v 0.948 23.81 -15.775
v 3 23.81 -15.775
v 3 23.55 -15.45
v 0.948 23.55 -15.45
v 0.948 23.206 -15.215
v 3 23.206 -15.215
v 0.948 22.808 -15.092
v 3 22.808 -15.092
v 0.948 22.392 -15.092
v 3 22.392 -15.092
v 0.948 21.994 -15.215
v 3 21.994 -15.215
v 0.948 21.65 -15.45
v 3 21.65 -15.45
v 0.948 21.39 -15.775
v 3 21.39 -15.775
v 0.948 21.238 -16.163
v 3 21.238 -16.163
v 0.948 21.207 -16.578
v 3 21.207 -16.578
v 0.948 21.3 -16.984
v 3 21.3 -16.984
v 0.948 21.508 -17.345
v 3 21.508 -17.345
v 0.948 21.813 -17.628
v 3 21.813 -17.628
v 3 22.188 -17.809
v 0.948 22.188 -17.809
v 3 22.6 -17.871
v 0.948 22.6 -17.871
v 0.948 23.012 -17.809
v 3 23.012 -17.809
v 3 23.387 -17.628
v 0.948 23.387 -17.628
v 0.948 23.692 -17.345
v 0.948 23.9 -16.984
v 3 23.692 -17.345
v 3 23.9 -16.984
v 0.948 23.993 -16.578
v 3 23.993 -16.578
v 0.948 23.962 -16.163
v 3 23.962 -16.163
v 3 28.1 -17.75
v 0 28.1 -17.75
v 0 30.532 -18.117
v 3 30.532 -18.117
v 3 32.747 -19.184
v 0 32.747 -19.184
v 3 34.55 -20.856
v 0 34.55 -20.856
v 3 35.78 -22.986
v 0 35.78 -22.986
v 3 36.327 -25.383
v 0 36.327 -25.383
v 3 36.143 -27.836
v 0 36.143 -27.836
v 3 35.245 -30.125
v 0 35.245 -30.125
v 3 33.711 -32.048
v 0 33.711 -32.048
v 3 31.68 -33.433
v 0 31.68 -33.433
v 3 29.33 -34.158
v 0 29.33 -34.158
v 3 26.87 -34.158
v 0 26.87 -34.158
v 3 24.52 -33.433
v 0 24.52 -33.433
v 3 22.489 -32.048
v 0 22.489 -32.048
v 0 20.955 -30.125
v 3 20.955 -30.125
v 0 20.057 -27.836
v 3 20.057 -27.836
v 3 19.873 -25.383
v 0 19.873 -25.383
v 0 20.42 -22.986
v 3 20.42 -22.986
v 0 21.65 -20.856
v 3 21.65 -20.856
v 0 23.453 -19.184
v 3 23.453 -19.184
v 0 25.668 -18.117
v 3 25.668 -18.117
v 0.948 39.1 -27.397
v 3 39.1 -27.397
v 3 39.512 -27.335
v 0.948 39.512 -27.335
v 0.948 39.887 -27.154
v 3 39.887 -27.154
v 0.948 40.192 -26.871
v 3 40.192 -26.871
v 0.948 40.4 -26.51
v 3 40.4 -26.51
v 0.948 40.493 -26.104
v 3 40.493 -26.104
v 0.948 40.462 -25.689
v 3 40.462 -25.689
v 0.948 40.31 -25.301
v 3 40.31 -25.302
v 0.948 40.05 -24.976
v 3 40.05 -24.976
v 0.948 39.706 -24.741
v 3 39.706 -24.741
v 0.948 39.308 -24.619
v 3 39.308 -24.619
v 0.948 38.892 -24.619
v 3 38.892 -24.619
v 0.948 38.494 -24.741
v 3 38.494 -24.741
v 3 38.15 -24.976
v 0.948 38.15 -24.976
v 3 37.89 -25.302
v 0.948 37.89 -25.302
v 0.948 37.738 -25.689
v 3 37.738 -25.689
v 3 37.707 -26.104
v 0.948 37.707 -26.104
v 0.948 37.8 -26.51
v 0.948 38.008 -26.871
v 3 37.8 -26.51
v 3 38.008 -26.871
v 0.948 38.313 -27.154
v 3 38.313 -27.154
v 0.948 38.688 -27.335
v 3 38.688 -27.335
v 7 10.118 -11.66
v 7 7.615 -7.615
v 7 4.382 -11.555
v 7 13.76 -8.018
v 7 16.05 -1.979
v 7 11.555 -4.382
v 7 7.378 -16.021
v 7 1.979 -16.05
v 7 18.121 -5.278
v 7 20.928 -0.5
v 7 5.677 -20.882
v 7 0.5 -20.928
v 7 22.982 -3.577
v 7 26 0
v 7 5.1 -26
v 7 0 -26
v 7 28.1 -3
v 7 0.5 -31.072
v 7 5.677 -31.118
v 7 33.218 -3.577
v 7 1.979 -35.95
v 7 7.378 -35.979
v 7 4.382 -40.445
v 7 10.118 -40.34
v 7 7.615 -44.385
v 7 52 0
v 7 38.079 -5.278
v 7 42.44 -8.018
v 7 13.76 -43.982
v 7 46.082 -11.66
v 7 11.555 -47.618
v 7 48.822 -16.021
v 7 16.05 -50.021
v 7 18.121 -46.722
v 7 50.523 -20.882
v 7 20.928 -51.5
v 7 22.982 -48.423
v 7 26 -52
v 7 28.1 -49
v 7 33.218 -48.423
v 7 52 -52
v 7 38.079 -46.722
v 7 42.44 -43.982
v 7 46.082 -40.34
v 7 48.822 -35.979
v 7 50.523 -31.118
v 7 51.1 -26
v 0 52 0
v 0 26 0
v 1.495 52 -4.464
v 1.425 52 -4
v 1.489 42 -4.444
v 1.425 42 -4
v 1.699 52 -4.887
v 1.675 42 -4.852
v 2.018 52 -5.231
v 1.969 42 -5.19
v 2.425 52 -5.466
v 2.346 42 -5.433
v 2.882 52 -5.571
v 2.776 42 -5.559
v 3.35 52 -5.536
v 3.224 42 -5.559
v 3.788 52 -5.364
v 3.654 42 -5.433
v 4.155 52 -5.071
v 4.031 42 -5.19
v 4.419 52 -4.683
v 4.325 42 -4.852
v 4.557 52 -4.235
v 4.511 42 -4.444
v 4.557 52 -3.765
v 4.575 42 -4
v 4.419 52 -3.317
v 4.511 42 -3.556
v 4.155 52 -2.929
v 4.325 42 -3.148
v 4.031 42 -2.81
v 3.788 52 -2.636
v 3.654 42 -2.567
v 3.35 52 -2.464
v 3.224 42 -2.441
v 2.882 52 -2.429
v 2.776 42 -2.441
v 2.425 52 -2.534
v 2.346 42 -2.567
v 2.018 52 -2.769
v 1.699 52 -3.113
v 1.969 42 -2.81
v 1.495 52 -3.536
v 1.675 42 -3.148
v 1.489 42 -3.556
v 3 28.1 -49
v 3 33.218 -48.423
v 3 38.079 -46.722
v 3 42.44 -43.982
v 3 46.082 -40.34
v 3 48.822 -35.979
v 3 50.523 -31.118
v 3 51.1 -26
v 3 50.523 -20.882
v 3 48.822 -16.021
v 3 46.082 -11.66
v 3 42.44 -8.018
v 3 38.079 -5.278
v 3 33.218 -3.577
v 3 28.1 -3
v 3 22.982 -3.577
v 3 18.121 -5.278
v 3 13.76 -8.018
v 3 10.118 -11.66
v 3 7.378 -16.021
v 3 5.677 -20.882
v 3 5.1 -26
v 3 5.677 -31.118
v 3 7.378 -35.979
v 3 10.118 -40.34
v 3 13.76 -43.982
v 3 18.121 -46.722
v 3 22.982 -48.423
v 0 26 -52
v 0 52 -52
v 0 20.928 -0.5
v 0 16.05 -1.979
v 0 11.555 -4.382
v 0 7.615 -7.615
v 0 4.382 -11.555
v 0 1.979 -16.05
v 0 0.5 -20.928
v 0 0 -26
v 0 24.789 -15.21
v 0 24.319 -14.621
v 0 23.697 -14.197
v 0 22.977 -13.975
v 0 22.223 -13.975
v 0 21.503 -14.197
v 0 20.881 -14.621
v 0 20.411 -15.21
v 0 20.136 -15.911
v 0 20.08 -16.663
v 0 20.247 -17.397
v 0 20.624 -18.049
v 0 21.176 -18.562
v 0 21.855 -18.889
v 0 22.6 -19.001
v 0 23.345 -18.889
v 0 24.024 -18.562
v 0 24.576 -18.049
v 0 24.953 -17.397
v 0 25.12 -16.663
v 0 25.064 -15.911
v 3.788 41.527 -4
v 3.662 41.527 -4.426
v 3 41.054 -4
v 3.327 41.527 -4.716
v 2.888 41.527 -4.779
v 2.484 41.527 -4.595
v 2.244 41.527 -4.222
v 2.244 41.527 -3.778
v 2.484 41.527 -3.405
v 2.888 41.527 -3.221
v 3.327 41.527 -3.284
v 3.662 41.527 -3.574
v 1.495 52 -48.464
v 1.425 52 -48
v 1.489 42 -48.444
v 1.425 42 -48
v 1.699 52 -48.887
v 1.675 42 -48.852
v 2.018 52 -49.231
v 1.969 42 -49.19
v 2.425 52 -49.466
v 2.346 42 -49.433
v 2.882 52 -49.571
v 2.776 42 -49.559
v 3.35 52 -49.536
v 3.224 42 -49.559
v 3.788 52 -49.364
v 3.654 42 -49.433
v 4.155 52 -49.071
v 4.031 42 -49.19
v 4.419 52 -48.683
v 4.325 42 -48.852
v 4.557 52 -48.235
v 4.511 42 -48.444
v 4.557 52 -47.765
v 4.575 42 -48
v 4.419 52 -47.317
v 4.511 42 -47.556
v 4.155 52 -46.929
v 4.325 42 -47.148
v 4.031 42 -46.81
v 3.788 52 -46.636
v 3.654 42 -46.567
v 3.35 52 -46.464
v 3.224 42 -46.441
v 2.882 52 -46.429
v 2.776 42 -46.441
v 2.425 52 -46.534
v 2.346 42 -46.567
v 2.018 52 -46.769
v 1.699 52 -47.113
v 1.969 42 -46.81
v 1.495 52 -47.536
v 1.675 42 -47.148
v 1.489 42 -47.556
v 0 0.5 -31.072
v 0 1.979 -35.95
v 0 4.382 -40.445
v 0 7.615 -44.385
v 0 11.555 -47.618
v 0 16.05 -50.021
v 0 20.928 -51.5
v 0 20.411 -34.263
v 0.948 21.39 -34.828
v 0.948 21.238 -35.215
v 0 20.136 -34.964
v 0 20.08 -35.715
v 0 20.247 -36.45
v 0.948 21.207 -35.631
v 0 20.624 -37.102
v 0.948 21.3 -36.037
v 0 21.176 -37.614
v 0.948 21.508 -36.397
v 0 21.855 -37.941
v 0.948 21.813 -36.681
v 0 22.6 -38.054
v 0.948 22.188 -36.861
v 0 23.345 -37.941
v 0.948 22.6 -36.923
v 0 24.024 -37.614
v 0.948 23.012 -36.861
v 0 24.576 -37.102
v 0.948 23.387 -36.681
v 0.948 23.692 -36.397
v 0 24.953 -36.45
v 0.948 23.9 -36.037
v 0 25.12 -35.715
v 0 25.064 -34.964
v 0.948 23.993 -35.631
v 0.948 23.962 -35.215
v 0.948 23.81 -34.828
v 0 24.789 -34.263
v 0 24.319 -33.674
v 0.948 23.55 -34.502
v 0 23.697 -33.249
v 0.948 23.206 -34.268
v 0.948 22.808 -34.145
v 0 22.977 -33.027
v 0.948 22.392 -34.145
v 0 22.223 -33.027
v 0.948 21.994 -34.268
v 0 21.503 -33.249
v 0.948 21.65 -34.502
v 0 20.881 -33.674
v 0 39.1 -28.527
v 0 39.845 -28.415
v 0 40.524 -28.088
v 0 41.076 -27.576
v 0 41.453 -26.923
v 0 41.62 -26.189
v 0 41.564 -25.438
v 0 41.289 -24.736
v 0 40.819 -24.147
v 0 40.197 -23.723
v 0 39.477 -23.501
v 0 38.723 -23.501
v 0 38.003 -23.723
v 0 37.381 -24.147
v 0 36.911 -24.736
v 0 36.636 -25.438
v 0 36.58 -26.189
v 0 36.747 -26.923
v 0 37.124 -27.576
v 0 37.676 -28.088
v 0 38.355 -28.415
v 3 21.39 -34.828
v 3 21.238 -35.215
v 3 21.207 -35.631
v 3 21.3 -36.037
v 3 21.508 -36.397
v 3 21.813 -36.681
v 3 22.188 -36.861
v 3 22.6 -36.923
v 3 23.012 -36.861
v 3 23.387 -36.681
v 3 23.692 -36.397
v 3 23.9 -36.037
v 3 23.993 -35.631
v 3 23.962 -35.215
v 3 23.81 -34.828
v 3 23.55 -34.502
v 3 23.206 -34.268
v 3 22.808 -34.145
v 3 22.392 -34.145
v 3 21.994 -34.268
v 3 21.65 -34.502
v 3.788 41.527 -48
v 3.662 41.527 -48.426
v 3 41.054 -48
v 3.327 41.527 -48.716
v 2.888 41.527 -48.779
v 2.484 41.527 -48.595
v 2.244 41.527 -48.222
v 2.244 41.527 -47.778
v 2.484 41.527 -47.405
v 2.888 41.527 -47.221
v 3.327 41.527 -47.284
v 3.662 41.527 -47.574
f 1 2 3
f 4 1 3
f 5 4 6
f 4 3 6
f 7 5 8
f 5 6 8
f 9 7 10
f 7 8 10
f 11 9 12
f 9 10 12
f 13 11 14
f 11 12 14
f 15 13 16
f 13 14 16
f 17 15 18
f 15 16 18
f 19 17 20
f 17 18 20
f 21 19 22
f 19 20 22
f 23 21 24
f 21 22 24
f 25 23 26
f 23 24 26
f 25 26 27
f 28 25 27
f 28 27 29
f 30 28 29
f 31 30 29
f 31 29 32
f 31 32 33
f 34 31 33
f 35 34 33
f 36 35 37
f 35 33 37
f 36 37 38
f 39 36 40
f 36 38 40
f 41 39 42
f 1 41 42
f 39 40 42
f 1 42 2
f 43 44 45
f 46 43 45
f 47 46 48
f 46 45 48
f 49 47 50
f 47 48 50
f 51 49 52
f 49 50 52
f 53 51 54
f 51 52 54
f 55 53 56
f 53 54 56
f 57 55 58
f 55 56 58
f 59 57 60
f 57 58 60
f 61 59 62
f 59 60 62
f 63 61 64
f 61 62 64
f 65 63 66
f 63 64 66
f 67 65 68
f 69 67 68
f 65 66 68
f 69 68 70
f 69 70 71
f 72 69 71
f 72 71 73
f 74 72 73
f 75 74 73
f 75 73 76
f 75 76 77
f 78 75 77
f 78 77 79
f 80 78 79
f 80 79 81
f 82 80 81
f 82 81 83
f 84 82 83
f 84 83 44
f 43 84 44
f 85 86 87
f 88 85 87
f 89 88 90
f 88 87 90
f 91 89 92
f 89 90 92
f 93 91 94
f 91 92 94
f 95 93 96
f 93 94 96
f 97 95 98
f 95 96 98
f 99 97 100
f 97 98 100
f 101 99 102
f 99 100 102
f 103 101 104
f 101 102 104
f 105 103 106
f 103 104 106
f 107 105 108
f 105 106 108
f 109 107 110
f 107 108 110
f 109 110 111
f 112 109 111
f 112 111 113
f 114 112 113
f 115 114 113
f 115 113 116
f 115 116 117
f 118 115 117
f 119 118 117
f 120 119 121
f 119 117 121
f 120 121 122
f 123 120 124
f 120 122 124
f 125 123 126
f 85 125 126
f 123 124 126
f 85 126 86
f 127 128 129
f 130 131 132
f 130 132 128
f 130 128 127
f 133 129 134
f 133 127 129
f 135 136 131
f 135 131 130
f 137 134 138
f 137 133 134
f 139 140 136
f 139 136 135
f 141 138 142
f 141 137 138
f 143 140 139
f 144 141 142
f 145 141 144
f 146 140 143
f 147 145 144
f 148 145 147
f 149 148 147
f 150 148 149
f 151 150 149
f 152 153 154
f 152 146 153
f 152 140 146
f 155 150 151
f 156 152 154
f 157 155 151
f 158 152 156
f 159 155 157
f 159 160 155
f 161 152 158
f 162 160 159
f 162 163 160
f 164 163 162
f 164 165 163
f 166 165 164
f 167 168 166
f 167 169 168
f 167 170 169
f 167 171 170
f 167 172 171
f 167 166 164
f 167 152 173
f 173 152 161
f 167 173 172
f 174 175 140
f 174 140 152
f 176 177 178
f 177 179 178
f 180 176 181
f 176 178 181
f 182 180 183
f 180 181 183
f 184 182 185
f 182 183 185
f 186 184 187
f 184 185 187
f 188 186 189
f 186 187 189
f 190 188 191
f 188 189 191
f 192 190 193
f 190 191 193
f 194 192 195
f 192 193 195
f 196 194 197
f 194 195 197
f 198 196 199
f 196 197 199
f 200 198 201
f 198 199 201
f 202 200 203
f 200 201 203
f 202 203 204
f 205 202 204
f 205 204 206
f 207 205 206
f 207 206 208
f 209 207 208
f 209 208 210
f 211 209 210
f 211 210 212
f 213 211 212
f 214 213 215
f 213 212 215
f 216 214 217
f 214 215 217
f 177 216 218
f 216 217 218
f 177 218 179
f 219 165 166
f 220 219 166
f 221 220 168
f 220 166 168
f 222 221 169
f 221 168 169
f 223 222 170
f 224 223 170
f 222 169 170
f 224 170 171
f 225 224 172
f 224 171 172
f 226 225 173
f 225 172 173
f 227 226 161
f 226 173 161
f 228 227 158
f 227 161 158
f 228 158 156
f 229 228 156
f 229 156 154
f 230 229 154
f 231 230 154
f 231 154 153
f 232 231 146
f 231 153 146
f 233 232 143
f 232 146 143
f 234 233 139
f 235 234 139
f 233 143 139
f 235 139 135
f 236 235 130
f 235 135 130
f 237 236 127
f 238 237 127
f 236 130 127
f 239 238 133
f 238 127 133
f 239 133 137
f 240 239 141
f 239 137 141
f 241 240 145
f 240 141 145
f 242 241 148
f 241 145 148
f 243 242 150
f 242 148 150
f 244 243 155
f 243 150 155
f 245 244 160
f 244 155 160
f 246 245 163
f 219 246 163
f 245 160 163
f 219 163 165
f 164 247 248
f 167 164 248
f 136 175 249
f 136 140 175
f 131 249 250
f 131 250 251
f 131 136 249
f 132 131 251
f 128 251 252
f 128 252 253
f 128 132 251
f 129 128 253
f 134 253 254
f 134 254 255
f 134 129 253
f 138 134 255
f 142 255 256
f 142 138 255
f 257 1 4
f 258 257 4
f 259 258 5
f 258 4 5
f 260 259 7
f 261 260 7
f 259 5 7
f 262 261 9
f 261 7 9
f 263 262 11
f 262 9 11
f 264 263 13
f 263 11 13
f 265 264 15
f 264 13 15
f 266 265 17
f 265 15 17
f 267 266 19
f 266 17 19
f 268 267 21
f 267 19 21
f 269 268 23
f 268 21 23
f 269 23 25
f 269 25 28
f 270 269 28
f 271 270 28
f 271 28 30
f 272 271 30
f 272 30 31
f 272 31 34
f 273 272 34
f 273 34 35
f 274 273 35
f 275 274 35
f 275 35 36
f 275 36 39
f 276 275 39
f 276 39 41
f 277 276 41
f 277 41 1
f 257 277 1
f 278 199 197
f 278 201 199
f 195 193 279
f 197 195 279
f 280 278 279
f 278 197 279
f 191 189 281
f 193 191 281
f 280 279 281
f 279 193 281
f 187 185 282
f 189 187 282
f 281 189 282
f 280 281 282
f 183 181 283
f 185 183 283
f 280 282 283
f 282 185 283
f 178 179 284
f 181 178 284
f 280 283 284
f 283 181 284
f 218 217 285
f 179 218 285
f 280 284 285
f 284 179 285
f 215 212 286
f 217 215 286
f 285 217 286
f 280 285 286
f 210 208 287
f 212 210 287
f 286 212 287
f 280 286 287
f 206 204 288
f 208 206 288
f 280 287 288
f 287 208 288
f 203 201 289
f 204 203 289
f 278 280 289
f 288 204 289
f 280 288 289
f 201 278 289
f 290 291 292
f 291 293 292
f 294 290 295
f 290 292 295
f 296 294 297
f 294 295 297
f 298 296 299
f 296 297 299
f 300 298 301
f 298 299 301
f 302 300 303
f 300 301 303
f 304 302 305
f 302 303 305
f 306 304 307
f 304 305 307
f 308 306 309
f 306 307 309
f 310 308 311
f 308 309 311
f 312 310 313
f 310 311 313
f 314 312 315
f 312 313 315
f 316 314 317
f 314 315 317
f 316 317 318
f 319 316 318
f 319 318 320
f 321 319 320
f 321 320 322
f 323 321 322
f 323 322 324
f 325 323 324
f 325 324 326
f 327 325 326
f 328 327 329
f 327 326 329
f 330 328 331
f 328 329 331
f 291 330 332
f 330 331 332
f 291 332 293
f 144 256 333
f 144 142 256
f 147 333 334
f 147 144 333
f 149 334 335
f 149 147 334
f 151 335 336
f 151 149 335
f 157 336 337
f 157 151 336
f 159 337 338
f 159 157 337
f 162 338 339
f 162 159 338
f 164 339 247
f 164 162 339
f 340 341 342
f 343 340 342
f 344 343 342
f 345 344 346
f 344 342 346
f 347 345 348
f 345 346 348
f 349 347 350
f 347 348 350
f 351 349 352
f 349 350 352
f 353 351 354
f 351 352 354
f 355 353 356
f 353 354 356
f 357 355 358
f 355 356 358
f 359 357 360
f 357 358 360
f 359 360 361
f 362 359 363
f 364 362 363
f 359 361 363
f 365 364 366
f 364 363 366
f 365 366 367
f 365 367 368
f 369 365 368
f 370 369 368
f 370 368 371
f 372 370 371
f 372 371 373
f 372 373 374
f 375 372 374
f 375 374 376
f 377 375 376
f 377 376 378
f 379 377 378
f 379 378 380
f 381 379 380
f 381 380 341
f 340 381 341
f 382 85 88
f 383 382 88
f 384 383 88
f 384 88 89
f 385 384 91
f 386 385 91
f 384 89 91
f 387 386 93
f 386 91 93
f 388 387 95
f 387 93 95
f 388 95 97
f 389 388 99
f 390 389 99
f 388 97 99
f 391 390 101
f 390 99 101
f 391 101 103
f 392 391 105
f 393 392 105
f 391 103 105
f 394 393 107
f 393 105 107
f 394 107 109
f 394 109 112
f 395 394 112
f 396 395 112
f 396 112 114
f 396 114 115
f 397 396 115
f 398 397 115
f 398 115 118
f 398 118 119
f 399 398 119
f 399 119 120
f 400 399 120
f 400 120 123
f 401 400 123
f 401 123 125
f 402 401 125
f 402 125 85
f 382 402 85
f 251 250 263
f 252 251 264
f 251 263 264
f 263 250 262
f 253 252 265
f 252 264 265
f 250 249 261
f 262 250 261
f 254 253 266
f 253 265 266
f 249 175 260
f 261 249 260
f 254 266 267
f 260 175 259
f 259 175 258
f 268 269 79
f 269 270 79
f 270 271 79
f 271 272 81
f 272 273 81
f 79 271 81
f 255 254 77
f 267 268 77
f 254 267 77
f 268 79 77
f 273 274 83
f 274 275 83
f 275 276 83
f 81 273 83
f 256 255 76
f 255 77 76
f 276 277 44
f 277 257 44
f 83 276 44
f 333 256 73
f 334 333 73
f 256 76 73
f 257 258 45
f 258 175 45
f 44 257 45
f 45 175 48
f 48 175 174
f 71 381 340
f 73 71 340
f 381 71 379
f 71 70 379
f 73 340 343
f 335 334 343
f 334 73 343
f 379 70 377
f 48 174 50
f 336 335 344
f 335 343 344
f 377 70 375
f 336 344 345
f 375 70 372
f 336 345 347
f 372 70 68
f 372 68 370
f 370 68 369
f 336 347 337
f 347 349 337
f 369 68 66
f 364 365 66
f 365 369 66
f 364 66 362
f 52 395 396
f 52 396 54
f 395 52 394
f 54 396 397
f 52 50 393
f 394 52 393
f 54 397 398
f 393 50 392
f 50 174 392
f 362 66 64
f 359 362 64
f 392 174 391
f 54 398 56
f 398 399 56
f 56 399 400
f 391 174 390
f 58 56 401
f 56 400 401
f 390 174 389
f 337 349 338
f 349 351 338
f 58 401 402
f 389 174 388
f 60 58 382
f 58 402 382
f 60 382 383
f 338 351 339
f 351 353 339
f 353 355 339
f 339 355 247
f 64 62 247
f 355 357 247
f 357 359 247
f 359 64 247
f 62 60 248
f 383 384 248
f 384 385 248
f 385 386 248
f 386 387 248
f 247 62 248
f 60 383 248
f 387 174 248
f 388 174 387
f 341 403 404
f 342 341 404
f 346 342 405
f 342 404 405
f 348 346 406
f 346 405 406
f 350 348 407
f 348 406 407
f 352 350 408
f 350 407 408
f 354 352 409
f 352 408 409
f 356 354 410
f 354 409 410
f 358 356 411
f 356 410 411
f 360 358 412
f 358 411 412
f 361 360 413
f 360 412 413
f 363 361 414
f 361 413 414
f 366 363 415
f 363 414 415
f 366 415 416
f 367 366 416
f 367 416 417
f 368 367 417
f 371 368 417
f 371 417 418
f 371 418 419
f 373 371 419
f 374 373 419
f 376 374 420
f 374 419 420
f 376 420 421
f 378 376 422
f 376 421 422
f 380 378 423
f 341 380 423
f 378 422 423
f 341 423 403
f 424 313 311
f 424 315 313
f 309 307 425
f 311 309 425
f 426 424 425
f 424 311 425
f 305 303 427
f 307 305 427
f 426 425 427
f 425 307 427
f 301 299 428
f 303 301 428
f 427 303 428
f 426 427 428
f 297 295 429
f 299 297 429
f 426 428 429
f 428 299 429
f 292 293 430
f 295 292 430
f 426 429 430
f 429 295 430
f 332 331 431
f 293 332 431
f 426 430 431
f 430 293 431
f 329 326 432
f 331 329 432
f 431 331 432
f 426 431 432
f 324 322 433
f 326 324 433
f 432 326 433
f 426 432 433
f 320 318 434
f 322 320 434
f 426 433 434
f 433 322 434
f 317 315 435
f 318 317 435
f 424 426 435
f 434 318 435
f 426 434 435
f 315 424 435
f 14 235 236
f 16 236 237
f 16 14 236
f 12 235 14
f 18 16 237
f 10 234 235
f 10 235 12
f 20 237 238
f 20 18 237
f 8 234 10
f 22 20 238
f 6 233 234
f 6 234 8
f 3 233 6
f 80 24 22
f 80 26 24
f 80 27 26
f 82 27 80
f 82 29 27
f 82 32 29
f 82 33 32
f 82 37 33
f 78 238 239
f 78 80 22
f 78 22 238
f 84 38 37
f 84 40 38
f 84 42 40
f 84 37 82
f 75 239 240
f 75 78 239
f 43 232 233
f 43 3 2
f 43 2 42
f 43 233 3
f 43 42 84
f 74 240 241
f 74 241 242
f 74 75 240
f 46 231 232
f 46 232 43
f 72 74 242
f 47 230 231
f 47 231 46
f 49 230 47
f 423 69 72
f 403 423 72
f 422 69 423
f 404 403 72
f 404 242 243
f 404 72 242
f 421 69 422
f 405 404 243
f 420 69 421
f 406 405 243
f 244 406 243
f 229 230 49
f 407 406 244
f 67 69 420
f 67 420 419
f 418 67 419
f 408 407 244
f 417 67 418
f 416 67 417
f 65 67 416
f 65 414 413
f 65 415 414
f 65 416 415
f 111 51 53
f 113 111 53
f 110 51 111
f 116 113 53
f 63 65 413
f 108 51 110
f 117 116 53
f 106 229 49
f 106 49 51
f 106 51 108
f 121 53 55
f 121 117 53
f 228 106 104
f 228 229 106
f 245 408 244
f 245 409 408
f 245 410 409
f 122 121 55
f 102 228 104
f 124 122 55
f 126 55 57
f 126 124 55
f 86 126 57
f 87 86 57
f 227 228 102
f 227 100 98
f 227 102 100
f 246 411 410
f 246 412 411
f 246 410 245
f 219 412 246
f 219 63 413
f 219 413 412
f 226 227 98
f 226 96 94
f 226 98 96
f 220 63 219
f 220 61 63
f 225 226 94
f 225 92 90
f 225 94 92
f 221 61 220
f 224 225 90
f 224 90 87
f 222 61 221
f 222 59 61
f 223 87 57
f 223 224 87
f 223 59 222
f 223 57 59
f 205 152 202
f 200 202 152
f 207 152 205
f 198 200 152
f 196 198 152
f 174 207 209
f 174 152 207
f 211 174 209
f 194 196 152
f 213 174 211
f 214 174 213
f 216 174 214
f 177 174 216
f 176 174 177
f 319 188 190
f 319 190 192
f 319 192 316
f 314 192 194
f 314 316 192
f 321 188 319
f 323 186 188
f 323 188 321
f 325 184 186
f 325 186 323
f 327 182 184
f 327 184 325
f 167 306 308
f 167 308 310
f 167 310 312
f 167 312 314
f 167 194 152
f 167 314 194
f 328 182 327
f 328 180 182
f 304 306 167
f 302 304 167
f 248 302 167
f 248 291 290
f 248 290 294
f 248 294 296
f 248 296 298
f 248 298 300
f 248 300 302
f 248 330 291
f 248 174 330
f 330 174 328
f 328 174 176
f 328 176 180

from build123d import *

# Parameters (mm, degrees)
ESBO_O1_W                                            = 52
ESBO_O1_H                                            = 52
RESSALTO_EXTRUS_O1_DEPTH                             = 7
ESBO_O2_R                                            = 8.25
CORTE_EXTRUS_O1_DEPTH                                = 74.87151007
ESCAREADO_PARA_PARAFUSO_DE_M_QUINA_COM_C_D           = 2.794
ESCAREADO_PARA_PARAFUSO_DE_M_QUINA_COM_C_CSINK_D     = 5.0546
ESCAREADO_PARA_PARAFUSO_DE_M_QUINA_COM_C_CSINK_ANGLE = 100
PADR_OCIRCULAR1_COUNT                                = 3
ESBO_O27_R                                           = 23
CORTE_EXTRUS_O5_DEPTH                                = 4
FILETE1_R                                            = 26
FURO_ROSCADO_PARA_CONDU_TE_DE_M3X0_51_D              = 3.15
FURO_ROSCADO_PARA_CONDU_TE_DE_M3X0_51_DEPTH          = 10
FURO_ROSCADO_PARA_CONDU_TE_DE_M3X0_51_TIP            = 0.946355475


with BuildPart() as part:
    # Esboço1 → Ressalto-extrusão1 (new body)
    with BuildSketch(Plane(origin=(0, 0, 0), x_dir=(0, 0, -1), z_dir=(1, 0, 0))):
        with Locations((26, 26)):
            Rectangle(ESBO_O1_W, ESBO_O1_H)
    extrude(amount=RESSALTO_EXTRUS_O1_DEPTH)

    # Esboço2 → Corte-extrusão1 (cut, through all)
    with BuildSketch(Plane.ZY):
        with Locations((-26, 28.1)):
            Circle(ESBO_O2_R)
    extrude(amount=-CORTE_EXTRUS_O1_DEPTH, mode=Mode.SUBTRACT)

    # Escareado para parafuso de máquina com cabeça chata (100) de #32 (through all)
    with Locations(Plane.ZY):
        with Locations((-26, 39.1)):
            escareado_para_parafuso_de_m_quina_com_c = CounterSinkHole(ESCAREADO_PARA_PARAFUSO_DE_M_QUINA_COM_C_D / 2, ESCAREADO_PARA_PARAFUSO_DE_M_QUINA_COM_C_CSINK_D / 2, counter_sink_angle=ESCAREADO_PARA_PARAFUSO_DE_M_QUINA_COM_C_CSINK_ANGLE)

    # PadrãoCircular1: Escareado para parafuso de máquina com cabeça chata (100) de #32 ×3 about axis
    padr_ocircular1_axis = Axis((0, 28.1, -26), (1, 0, 0))
    for i in range(1, PADR_OCIRCULAR1_COUNT):
        add(escareado_para_parafuso_de_m_quina_com_c.rotate(padr_ocircular1_axis, i * 360 / PADR_OCIRCULAR1_COUNT), mode=Mode.SUBTRACT)

    # Esboço27 → Corte-extrusão5 (cut)
    with BuildSketch(Plane(origin=(7, 0, 0), x_dir=(0, 0, -1), z_dir=(1, 0, 0))):
        with Locations((26, 28.1)):
            Circle(ESBO_O27_R)
    extrude(amount=-CORTE_EXTRUS_O5_DEPTH, mode=Mode.SUBTRACT)

    # Filete1
    filete1_edges = [part.edges().sort_by_distance(p)[0] for p in [
        (3.5, 0, -52),
        (3.5, 0, 0),
    ]]
    fillet(filete1_edges, radius=FILETE1_R - 0.0001)  # a hair under: the kernel refuses the full size

    # Furo roscado para conduíte de M3x0.51
    with Locations(Plane(origin=(0, 52, 0), x_dir=(1, 0, 0), z_dir=(0, 1, 0))):
        with Locations((3, 48), (3, 4)):
            Hole(FURO_ROSCADO_PARA_CONDU_TE_DE_M3X0_51_D / 2, depth=FURO_ROSCADO_PARA_CONDU_TE_DE_M3X0_51_DEPTH)
            with Locations((0, 0, -(FURO_ROSCADO_PARA_CONDU_TE_DE_M3X0_51_DEPTH + FURO_ROSCADO_PARA_CONDU_TE_DE_M3X0_51_TIP / 2))):  # 118° drill point
                Cone(0, FURO_ROSCADO_PARA_CONDU_TE_DE_M3X0_51_D / 2, FURO_ROSCADO_PARA_CONDU_TE_DE_M3X0_51_TIP, mode=Mode.SUBTRACT)


solid = part.part
